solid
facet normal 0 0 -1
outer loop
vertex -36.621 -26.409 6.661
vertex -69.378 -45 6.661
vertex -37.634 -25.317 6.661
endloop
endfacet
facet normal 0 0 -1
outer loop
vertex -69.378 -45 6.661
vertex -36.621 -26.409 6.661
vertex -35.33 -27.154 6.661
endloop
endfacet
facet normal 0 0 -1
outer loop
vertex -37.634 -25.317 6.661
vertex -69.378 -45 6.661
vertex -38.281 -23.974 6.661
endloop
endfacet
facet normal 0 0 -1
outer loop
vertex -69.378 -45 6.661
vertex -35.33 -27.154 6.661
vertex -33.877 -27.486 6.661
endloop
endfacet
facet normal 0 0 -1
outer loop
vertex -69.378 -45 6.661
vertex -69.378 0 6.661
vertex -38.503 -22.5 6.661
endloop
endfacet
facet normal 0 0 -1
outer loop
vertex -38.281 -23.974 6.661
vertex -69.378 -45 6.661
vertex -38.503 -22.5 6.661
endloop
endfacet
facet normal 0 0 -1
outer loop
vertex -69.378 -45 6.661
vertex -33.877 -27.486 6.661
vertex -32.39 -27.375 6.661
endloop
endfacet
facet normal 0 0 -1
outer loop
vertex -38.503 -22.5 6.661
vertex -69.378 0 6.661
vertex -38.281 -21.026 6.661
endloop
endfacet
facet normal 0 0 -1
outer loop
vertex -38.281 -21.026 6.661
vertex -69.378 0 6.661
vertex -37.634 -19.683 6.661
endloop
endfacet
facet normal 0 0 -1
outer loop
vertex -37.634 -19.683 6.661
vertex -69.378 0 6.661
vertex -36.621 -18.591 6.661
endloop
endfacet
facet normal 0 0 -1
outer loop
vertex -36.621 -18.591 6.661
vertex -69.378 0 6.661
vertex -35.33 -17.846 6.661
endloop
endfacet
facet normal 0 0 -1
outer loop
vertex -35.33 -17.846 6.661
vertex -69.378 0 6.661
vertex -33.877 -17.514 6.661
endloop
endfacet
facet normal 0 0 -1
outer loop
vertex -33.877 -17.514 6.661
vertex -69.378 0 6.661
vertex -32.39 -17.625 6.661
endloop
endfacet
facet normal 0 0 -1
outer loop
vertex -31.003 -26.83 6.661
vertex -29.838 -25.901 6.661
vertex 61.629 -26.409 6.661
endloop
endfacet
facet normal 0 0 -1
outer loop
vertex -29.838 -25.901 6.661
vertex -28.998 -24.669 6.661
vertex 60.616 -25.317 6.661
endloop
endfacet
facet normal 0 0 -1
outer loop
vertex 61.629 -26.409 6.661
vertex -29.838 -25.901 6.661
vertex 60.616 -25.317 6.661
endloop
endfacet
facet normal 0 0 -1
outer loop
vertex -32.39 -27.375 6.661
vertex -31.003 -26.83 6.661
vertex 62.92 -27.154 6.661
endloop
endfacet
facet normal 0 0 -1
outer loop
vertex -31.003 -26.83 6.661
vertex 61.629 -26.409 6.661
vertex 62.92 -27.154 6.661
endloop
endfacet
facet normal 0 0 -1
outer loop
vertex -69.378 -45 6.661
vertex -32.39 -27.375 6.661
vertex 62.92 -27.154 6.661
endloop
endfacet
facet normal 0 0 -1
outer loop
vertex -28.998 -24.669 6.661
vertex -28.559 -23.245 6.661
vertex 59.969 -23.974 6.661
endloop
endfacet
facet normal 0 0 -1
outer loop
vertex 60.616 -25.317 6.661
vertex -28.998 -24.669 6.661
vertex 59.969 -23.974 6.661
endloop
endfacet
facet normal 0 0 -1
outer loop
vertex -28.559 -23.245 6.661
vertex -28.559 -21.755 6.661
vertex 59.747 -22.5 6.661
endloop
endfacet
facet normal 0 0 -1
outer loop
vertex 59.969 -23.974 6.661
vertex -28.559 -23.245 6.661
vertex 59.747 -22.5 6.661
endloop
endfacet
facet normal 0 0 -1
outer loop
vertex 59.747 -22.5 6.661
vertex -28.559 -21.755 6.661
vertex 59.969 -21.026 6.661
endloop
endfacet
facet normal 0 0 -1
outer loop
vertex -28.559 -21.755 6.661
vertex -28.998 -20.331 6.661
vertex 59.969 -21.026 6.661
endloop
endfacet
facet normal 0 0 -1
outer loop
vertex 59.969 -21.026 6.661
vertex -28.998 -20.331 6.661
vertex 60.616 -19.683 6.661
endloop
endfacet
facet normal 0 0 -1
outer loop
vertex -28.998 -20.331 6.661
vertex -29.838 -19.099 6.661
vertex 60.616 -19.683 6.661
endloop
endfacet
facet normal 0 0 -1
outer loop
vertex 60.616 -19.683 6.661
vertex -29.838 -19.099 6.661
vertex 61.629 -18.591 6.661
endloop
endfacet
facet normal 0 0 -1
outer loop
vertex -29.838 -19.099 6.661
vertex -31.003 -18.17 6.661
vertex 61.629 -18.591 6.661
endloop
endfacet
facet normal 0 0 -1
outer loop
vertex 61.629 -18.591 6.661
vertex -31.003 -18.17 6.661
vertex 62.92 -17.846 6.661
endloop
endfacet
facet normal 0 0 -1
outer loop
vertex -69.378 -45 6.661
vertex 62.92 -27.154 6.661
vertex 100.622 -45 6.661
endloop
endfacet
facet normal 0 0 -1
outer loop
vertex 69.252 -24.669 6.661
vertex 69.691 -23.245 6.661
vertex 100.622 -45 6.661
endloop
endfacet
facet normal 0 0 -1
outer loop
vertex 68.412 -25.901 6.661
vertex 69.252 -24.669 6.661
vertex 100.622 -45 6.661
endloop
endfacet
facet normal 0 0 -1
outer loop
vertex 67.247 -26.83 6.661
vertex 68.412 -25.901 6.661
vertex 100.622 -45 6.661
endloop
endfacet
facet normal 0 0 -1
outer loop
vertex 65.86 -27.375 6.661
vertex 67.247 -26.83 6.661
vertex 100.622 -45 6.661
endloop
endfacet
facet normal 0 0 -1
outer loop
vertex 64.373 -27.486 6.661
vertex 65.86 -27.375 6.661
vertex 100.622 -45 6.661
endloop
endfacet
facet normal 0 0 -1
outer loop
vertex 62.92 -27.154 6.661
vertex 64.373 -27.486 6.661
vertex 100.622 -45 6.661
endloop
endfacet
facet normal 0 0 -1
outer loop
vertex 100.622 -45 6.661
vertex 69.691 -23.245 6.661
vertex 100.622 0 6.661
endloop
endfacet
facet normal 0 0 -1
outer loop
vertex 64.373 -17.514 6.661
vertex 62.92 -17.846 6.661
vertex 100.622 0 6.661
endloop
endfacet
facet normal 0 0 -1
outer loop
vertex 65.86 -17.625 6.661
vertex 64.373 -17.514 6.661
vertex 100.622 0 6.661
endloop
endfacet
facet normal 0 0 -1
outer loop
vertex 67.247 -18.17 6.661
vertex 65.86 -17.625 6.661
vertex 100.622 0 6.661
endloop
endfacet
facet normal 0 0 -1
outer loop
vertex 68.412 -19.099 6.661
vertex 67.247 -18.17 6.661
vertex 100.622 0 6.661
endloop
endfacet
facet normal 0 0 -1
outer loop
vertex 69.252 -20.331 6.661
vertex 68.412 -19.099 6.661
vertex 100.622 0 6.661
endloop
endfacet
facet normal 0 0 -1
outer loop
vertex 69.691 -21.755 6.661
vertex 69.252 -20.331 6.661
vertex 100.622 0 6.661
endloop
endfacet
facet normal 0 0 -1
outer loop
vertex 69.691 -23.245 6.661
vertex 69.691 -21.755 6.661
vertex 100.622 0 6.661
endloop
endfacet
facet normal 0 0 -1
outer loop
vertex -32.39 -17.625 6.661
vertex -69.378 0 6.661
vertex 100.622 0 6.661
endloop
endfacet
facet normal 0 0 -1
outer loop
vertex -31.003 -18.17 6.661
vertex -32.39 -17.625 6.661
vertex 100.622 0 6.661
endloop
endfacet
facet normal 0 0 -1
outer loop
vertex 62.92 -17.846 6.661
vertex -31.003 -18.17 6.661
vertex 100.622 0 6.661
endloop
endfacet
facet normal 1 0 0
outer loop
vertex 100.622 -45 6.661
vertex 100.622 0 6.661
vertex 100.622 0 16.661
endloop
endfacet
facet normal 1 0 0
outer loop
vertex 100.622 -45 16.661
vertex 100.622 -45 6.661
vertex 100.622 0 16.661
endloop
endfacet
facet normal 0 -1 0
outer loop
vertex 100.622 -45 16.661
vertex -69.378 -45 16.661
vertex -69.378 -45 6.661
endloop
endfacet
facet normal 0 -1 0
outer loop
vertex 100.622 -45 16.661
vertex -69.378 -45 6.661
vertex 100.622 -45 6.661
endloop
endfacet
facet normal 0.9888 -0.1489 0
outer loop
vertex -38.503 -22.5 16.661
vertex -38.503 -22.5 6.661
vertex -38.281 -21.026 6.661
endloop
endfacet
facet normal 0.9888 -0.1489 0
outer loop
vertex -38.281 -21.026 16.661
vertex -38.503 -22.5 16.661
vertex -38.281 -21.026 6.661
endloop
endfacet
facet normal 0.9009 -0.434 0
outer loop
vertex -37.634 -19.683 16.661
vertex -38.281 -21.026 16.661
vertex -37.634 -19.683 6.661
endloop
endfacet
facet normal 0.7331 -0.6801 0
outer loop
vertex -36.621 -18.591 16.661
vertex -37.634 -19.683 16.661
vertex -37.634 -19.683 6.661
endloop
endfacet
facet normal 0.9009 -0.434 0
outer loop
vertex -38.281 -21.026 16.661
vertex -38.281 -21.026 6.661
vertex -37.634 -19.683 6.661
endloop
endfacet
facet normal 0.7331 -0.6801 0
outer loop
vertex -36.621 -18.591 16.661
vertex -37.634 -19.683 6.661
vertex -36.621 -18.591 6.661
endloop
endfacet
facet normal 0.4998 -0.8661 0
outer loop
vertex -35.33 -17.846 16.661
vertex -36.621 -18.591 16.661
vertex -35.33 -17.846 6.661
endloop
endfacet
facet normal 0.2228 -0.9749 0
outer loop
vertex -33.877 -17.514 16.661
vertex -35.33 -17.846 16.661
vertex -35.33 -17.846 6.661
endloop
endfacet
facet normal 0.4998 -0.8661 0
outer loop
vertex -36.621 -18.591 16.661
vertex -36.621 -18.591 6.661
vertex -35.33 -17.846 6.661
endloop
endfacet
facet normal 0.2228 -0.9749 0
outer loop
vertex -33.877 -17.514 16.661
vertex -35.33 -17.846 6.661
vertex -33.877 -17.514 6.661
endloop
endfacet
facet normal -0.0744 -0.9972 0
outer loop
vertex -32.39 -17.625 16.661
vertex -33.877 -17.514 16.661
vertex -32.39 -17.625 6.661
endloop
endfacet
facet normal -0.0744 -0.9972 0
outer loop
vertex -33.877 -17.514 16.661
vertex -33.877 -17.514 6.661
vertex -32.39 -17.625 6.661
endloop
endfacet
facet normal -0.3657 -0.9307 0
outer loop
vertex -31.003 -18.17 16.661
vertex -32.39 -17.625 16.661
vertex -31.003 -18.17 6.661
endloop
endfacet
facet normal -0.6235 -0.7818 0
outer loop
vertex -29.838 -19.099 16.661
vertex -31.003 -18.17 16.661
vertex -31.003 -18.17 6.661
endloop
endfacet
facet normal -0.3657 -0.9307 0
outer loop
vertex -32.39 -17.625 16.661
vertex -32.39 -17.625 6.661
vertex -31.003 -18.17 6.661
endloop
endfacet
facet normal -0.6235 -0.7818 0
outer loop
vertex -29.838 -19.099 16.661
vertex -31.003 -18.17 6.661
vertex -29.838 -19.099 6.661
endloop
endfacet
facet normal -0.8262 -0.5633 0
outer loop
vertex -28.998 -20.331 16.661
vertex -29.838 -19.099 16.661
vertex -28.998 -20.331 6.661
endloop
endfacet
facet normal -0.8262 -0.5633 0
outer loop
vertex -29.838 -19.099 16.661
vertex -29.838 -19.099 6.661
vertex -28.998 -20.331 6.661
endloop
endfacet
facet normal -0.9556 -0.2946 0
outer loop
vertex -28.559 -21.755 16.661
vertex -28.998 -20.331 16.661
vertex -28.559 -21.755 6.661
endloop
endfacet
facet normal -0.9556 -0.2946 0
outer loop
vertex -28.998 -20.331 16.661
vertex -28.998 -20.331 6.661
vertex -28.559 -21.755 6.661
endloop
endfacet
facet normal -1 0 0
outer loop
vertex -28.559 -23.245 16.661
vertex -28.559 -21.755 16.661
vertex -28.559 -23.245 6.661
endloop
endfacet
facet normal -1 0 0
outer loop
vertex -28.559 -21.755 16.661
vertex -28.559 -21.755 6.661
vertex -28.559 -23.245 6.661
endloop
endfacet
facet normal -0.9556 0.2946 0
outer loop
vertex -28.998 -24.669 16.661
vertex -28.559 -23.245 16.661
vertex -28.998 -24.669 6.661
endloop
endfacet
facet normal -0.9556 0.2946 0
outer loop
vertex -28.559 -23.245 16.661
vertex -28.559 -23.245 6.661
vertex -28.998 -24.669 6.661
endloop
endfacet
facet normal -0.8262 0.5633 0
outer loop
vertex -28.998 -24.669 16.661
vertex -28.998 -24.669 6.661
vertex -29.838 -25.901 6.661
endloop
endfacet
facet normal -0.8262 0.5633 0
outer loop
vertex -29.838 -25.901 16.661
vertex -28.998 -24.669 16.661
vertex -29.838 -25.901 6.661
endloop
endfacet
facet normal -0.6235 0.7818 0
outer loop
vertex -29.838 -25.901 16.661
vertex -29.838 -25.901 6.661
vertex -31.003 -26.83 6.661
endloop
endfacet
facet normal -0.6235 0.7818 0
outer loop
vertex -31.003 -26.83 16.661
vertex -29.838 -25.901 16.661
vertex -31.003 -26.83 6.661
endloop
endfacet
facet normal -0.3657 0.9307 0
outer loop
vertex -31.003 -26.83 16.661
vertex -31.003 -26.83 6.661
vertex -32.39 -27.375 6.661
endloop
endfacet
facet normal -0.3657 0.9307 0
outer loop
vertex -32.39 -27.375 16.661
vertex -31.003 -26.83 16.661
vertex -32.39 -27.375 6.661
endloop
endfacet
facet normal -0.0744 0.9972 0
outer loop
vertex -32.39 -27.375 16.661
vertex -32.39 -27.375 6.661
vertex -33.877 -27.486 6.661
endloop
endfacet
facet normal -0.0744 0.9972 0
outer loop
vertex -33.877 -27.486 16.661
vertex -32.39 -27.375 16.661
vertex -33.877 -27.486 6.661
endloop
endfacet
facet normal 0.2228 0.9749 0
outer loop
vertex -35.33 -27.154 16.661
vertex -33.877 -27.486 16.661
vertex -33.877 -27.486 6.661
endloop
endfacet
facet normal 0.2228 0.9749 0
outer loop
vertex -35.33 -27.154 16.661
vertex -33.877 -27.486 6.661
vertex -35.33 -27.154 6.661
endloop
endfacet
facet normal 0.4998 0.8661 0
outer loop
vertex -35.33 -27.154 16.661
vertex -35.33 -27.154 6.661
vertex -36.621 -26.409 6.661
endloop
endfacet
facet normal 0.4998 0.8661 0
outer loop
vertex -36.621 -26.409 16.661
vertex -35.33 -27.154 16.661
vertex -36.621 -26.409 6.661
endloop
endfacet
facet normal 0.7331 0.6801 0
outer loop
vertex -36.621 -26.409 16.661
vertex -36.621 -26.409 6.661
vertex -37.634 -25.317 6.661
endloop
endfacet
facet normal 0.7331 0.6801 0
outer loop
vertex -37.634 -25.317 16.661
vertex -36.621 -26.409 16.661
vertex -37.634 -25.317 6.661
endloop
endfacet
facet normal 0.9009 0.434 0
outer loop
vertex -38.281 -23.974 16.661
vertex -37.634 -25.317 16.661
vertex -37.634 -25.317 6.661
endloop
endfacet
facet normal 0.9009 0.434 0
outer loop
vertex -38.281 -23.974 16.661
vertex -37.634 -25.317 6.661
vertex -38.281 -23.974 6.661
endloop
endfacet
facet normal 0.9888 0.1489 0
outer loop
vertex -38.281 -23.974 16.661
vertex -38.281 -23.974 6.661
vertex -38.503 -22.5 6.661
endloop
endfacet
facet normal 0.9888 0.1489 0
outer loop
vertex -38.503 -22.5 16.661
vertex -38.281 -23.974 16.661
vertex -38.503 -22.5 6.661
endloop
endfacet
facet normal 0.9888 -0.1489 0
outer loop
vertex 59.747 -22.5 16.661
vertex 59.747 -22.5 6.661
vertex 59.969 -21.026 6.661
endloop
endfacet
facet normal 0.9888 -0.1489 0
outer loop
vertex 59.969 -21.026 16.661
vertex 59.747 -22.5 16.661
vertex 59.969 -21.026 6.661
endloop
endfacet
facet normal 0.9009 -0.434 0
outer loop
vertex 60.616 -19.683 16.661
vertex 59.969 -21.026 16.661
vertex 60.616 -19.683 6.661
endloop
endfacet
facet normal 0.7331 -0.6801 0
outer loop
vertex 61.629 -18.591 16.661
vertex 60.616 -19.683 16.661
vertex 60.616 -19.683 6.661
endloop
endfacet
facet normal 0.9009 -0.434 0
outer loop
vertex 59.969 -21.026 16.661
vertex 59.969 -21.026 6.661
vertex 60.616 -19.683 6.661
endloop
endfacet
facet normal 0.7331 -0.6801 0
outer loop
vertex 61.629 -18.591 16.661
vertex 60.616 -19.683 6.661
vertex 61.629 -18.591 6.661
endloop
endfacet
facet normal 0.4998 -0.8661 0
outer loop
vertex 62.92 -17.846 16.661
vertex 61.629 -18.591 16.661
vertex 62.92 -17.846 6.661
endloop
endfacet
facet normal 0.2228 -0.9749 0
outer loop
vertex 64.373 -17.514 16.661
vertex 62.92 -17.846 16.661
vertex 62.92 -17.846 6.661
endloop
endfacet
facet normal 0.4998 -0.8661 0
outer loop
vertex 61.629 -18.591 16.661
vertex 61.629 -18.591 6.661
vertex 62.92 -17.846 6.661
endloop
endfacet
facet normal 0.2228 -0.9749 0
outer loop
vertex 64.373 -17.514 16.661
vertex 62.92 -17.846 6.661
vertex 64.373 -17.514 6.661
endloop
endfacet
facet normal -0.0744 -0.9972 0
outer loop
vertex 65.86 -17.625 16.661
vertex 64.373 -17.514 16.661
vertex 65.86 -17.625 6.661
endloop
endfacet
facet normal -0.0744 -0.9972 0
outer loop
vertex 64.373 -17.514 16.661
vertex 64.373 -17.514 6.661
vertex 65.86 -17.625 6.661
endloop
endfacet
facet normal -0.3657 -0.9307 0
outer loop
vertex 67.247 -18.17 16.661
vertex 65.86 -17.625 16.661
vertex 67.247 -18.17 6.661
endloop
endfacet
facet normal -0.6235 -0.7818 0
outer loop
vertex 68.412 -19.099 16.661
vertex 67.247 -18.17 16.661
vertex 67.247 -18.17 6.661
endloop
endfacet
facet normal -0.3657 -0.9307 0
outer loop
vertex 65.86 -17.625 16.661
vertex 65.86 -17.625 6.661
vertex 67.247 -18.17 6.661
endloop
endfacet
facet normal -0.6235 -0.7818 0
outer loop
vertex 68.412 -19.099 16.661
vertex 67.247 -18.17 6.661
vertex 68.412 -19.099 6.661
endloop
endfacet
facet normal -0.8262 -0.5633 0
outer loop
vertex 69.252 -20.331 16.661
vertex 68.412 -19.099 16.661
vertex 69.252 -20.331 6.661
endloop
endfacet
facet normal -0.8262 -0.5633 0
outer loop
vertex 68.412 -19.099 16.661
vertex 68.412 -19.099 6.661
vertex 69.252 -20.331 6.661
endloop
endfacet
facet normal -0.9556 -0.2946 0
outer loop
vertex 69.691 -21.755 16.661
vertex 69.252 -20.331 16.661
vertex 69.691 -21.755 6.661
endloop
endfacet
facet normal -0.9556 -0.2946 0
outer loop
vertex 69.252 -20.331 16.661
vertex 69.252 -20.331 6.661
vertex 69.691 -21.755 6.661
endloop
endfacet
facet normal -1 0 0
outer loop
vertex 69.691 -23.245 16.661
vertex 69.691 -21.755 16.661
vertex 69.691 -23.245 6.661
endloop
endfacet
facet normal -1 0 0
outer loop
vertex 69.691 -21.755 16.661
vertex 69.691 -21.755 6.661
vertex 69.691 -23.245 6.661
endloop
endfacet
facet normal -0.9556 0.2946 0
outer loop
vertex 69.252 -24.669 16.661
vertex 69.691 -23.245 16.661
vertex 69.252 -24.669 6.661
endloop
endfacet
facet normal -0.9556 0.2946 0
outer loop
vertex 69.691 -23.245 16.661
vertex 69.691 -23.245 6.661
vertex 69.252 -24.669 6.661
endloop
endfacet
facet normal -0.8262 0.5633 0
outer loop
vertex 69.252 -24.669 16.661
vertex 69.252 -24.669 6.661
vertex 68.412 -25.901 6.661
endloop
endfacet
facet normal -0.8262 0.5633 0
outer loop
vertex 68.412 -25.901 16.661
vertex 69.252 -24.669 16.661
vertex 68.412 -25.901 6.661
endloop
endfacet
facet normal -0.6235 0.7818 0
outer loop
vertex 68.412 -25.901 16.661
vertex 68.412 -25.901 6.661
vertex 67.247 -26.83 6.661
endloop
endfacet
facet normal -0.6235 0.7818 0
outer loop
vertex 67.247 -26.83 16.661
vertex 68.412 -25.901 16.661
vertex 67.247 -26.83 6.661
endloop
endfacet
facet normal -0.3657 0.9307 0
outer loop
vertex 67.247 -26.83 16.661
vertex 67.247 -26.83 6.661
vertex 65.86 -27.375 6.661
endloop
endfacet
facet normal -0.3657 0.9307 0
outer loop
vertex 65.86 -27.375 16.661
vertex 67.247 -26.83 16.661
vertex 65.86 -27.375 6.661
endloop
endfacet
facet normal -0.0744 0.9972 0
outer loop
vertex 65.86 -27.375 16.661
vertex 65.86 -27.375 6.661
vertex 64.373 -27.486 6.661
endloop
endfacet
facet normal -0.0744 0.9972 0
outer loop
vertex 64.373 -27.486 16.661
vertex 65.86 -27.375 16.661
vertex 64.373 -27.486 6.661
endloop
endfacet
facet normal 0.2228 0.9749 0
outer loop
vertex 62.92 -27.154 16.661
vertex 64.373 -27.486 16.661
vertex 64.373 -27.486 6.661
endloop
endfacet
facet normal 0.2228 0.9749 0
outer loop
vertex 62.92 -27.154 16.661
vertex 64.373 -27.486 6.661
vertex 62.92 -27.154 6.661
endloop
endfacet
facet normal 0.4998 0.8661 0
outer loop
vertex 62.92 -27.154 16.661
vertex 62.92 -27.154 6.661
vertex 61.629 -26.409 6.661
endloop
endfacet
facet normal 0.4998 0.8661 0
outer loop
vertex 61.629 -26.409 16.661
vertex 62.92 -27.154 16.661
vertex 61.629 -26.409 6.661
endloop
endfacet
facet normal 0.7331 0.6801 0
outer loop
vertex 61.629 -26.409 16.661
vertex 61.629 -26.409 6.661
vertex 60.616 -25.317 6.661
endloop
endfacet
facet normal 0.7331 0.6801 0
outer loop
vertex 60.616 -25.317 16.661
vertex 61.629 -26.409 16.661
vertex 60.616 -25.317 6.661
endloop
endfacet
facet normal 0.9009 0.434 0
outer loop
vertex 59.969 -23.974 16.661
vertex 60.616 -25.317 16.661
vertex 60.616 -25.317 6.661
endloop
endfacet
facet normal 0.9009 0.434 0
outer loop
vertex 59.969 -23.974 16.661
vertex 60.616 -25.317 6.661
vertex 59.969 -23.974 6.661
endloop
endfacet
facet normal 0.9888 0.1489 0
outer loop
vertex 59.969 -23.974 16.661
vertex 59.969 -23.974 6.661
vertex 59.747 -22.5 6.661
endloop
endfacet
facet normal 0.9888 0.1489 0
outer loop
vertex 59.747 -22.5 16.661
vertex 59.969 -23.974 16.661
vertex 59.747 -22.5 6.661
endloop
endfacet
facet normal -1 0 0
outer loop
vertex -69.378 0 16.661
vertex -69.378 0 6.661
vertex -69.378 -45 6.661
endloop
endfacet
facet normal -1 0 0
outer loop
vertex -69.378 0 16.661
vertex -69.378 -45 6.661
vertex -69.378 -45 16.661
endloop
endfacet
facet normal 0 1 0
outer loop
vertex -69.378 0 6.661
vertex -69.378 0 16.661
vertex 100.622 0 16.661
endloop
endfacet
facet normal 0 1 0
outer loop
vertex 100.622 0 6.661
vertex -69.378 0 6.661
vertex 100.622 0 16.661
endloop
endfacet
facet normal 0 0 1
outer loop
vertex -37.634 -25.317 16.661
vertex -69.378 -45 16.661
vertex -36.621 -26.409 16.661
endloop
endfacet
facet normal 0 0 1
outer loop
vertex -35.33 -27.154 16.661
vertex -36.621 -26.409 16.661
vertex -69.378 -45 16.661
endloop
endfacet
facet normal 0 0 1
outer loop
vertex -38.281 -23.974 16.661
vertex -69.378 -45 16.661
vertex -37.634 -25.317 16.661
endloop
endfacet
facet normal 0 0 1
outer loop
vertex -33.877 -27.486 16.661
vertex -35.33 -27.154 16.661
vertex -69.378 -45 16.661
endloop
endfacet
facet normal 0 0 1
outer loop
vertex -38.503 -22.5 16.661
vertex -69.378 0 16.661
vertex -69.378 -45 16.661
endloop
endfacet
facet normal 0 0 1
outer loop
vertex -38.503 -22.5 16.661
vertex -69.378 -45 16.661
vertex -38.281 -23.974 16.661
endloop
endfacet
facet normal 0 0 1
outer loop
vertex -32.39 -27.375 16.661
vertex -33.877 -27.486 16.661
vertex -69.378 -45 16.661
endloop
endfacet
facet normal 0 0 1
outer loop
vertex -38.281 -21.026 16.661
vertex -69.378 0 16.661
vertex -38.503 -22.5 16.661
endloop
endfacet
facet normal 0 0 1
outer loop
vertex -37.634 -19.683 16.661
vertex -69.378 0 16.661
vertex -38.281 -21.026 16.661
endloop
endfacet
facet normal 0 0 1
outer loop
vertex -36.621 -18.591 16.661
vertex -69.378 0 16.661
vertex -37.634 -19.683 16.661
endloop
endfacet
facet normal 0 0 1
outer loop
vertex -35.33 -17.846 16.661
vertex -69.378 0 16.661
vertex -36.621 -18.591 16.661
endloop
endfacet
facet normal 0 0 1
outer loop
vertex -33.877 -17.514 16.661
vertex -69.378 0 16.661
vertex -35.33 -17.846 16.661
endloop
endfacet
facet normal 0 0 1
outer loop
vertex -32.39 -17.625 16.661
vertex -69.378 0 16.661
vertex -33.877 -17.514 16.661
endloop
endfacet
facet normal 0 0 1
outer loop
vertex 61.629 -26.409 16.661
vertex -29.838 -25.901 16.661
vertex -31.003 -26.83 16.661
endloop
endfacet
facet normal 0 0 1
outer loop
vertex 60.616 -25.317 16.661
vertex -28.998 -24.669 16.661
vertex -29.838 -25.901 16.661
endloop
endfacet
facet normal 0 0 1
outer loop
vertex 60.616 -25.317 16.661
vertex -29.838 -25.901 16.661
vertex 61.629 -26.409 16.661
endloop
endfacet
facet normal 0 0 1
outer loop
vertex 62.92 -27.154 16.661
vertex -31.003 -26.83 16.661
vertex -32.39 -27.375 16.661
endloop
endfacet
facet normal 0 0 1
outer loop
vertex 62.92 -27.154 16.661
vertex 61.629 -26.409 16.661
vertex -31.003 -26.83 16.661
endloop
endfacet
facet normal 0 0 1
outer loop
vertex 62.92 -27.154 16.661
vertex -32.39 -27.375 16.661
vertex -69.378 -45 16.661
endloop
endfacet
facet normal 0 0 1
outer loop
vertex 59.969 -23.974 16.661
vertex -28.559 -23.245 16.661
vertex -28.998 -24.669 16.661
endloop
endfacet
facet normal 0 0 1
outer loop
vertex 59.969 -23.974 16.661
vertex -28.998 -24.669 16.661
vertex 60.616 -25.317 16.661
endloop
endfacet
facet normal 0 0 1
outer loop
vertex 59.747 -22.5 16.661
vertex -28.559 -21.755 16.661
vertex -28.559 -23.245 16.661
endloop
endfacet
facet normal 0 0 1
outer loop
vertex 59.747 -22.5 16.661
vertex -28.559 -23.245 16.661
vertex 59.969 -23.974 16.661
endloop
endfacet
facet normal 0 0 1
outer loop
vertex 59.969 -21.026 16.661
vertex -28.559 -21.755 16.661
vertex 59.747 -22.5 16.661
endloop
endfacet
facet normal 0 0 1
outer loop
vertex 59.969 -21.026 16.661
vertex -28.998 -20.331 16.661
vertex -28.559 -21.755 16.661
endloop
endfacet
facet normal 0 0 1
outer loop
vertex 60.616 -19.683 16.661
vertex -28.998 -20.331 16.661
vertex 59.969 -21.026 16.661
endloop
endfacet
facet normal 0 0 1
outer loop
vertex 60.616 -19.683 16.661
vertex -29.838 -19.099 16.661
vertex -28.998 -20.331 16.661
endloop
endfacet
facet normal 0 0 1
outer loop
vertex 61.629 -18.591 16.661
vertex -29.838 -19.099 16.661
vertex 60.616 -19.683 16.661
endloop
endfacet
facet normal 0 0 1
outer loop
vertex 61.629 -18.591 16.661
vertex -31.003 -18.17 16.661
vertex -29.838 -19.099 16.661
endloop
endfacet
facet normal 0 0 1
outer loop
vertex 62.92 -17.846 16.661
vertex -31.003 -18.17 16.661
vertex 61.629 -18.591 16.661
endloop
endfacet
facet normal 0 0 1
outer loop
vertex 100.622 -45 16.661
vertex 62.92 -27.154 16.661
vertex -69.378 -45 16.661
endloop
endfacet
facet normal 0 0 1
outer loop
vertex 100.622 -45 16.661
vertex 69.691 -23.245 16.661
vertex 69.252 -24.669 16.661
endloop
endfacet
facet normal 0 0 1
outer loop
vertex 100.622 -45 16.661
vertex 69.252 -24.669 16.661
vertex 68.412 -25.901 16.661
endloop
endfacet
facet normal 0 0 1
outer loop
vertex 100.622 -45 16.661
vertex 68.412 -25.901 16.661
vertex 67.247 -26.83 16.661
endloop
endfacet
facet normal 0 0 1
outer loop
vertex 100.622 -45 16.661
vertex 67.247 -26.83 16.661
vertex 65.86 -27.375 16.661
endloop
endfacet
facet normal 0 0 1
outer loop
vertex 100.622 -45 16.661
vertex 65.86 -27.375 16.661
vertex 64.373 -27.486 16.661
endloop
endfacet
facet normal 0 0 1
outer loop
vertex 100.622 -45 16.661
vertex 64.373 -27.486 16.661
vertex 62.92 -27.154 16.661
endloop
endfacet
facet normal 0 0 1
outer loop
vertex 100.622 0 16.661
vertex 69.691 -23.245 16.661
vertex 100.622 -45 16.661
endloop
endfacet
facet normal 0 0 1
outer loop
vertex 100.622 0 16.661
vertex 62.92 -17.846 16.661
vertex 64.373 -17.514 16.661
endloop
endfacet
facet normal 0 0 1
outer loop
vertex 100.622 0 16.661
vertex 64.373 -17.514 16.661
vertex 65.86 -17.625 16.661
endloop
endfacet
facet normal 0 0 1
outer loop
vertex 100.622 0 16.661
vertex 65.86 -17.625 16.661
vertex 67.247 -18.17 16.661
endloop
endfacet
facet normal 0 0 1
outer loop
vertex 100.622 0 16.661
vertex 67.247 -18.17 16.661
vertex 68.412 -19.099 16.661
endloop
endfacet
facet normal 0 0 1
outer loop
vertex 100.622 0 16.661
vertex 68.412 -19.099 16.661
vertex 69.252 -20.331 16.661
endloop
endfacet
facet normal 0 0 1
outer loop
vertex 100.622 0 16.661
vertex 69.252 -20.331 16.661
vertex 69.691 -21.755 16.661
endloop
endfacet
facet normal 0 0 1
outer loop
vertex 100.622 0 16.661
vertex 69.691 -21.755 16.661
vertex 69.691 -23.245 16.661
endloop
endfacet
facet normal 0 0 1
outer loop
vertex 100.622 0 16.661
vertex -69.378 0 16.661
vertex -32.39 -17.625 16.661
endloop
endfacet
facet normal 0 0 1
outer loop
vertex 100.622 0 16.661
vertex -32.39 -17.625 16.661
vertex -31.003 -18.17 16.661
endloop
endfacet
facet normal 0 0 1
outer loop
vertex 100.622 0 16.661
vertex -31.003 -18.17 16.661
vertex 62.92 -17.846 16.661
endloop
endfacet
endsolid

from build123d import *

# Parameters (mm, degrees)
F0_W     = 170
F0_H     = 10
F1_DEPTH = 45
F3_D     = 10


with BuildPart() as f1:
    # F0 (on Front) → F1 (new body)
    with BuildSketch(Plane.XZ):
        with Locations((15.6219, 11.661158)):
            Rectangle(F0_W, F0_H)
    extrude(amount=F1_DEPTH)

    # F3 (through all)
    with Locations(Plane.XY.offset(16.661158)):
        with Locations((-33.5031, -22.5), (64.7469, -22.5)):
            Hole(F3_D / 2)


solid = f1.part
